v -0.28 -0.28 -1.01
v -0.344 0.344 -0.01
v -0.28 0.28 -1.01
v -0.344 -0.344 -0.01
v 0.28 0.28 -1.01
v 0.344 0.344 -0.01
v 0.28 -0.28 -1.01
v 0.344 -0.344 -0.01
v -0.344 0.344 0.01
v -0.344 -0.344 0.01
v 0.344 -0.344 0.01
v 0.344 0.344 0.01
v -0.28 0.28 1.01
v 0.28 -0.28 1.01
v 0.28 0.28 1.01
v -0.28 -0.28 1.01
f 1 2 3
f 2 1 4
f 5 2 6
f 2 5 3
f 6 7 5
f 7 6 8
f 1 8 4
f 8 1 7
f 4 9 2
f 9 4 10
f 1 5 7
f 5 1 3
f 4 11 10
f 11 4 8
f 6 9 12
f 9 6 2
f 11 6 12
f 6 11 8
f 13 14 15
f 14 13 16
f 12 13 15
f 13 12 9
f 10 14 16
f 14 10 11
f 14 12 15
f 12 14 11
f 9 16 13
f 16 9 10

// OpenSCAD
$fn=96;

sx = 0.8;
sy = 0.8;
sz = 2.0;

ch = 0.08;          // vertical edge bevel amount
mid_bulge = 0.06;   // wider at mid-height
end_taper = 0.10;   // narrower at top/bottom
panel_inset = 0.05; // subtle inset panel depth
panel_margin = 0.12;

module chamfered_prism(w, d, h, c){
    linear_extrude(height=h, center=true)
        offset(delta=-c, chamfer=true)
            square([w, d], center=true);
}

module outer_body(){
    // Create a tapered/bulged profile along Z by hulling three chamfered sections
    union(){
        hull(){
            translate([0,0,-sz/2]) chamfered_prism(sx*(1-end_taper), sy*(1-end_taper), 0.02, ch);
            translate([0,0,0])      chamfered_prism(sx*(1+mid_bulge), sy*(1+mid_bulge), 0.02, ch);
        }
        hull(){
            translate([0,0,0])      chamfered_prism(sx*(1+mid_bulge), sy*(1+mid_bulge), 0.02, ch);
            translate([0,0, sz/2])  chamfered_prism(sx*(1-end_taper), sy*(1-end_taper), 0.02, ch);
        }
    }
}

module inset_panels(){
    // Subtract shallow recessed rectangles on the four side faces
    // Front/back
    for (s = [-1, 1]){
        translate([0, s*(sy/2 + 0.001), 0])
            rotate([90,0,0])
                linear_extrude(height=panel_inset, center=false)
                    square([sx - 2*panel_margin, sz - 2*panel_margin], center=true);
    }
    // Left/right
    for (s = [-1, 1]){
        translate([s*(sx/2 + 0.001), 0, 0])
            rotate([90,0,90])
                linear_extrude(height=panel_inset, center=false)
                    square([sy - 2*panel_margin, sz - 2*panel_margin], center=true);
    }
}

difference(){
    outer_body();
    inset_panels();
}
